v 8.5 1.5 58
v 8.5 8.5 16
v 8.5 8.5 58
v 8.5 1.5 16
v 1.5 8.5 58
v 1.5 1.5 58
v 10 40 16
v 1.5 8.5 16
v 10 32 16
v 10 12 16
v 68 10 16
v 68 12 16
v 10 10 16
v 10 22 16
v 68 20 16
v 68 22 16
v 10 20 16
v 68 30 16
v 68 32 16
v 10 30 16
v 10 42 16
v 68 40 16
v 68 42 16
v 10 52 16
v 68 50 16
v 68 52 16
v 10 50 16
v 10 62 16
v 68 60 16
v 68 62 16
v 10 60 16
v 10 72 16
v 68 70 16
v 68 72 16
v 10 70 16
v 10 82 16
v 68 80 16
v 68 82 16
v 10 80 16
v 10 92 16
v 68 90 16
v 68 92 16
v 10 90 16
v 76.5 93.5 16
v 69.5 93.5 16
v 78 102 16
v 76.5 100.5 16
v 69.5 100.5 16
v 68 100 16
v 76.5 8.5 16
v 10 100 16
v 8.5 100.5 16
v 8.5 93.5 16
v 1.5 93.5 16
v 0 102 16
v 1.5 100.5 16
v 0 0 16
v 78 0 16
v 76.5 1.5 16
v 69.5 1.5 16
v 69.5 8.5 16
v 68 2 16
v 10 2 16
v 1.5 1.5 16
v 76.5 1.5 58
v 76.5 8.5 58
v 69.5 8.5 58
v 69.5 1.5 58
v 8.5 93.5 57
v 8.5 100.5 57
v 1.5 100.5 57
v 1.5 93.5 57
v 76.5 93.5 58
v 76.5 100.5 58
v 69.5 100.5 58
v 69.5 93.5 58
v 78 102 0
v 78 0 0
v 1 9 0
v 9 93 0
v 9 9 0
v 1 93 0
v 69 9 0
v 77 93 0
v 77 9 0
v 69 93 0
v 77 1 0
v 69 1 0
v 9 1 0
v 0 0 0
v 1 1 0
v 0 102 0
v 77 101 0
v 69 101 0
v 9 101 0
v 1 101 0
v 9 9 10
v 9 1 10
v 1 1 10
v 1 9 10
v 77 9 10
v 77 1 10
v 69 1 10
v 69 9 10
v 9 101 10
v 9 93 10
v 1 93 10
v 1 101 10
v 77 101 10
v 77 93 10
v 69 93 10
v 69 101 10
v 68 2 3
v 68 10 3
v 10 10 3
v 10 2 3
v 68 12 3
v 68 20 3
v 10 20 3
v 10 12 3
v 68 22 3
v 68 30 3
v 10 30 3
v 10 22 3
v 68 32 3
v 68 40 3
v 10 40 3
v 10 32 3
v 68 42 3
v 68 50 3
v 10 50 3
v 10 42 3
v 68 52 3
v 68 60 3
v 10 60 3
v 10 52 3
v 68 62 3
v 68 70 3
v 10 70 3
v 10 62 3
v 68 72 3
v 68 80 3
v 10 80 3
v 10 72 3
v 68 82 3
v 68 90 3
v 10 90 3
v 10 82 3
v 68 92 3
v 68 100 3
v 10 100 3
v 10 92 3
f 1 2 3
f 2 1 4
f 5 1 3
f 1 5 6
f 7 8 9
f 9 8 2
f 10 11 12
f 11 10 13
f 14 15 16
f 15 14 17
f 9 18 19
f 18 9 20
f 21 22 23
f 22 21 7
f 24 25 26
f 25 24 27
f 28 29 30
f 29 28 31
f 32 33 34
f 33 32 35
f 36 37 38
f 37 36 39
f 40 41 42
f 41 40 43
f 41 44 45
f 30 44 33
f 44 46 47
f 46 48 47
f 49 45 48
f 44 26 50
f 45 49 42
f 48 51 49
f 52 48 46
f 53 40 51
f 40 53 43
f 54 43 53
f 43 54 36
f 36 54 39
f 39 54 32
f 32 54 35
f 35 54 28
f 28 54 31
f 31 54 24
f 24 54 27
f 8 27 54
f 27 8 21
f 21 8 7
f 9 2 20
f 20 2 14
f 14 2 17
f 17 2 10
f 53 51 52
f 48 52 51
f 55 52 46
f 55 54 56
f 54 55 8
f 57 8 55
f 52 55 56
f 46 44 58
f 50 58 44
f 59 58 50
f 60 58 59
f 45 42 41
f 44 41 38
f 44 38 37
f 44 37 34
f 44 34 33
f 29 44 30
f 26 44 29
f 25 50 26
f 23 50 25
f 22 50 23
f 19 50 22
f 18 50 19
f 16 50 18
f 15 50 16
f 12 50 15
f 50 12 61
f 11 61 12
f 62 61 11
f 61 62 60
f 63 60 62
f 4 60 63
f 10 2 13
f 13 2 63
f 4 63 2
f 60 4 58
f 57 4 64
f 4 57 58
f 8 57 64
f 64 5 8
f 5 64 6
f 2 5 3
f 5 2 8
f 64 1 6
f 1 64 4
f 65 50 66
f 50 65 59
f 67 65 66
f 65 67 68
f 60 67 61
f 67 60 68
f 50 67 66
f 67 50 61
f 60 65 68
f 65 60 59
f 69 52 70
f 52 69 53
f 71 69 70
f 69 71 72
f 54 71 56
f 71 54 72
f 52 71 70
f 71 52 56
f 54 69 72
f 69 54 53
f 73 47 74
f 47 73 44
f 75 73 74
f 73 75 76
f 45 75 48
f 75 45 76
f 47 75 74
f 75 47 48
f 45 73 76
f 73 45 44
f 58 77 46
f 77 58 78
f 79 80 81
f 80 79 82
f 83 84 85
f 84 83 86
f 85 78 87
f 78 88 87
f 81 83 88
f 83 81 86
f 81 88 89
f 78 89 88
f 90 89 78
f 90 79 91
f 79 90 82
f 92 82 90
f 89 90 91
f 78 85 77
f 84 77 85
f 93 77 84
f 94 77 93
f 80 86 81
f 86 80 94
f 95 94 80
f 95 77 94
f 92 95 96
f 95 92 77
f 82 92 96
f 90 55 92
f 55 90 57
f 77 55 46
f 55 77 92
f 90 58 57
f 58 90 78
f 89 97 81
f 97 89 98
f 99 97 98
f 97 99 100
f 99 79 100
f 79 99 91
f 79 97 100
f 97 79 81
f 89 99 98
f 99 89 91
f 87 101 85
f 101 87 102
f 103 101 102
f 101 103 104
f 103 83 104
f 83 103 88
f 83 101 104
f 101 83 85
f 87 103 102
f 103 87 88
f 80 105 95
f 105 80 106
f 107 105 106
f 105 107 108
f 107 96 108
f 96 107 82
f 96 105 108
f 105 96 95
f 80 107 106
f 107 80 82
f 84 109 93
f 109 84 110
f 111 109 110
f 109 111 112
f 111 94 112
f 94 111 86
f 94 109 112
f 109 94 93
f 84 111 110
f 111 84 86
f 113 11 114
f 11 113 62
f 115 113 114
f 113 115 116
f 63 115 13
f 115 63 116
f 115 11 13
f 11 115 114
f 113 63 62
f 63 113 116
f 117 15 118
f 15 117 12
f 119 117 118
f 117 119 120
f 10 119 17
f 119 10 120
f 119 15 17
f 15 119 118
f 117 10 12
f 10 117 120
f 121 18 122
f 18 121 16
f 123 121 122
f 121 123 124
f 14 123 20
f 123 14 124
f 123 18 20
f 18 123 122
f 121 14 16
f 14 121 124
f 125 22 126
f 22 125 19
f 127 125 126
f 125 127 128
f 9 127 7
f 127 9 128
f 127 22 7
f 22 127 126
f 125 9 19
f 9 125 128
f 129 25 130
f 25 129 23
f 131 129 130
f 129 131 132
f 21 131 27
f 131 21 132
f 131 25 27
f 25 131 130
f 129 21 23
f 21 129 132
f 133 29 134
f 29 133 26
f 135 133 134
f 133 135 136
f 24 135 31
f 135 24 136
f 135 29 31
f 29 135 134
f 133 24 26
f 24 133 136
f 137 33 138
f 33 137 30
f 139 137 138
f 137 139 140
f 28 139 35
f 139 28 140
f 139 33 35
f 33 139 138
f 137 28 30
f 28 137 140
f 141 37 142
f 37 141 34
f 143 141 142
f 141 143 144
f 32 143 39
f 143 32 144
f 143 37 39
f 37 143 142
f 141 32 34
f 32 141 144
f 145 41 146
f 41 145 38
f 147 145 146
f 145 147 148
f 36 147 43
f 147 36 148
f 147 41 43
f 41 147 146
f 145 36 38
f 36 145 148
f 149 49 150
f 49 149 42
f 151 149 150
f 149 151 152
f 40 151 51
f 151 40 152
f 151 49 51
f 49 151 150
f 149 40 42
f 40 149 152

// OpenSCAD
// Gameboy Cartridge Holder version 2.0
// Design by Patrick Connelly (patrick@deadlypenguin.com)

/* [Cartridge] */
cartridge_type = "gba"; //[gba: Gameboy Advanced,gbc:Gameboy Classic,both: Both]
number_of_cartridges = 10; //[5:15]
allow_cartridge_removal = "no"; // [yes,no]

/* [Hidden] */
cart_width = 58;
cart_depth = 8;
gba_cart_height = 35;
gbc_cart_height = 65;

cart_pocket_height = 14;
cart_pocket_gap = 2;

base_height = 16;

no_remove_padding = 10;

support_rod_width = 7;
support_rod_depth = support_rod_width;

support_pocket_inner_padding = 1;

support_pocket_width = support_rod_width + support_pocket_inner_padding;
support_pocket_depth = support_rod_depth + support_pocket_inner_padding;
support_pocket_height = 10;
support_pocket_padding = 1;

cart_height = (cartridge_type == "gba") ? gba_cart_height : gbc_cart_height;
cart_padding = (allow_cartridge_removal == "no") ? no_remove_padding : no_remove_padding + cart_height;

// Default to gba with no-remove
support_rod_height = (cart_height - cart_pocket_height) + cart_padding + support_pocket_height;

echo(support_rod_height);
support_rod_padding = support_pocket_padding + ((support_pocket_width - support_rod_width) / 2);

base_depth = (cart_depth + cart_pocket_gap) * number_of_cartridges + cart_pocket_gap;

side_rail_width = support_pocket_width + support_pocket_padding * 2;

base_width = cart_width + side_rail_width * 2;

module base() {
	cube([base_width, base_depth, base_height]);
}

module support_pockets() {
	support_pocket_x = base_width - support_pocket_padding - support_pocket_width;
	support_pocket_y = base_depth - support_pocket_padding - support_pocket_width;
	union() {
		translate([support_pocket_padding,support_pocket_padding,-1])
			cube([support_pocket_width, support_pocket_depth, support_pocket_height + 1]);
		translate([support_pocket_x, support_pocket_padding, -1])
		cube([support_pocket_width, support_pocket_depth, support_pocket_height + 1]);
		translate([support_pocket_padding, support_pocket_y, -1])
		cube([support_pocket_width, support_pocket_depth, support_pocket_height + 1]);
		translate([support_pocket_x, support_pocket_y, -1])
		cube([support_pocket_width, support_pocket_depth, support_pocket_height + 1]);
	}
}

module support_rods() {
	support_rod_x = base_width - support_rod_padding - support_rod_width;
	support_rod_y = base_depth - support_rod_padding - support_rod_width;
	
	union() {
		translate([support_rod_padding,support_rod_padding,base_height])
			cube([support_rod_width, support_rod_depth, support_rod_height + 1]);
		translate([support_rod_x, support_rod_padding, base_height])
		cube([support_rod_width, support_rod_depth, support_rod_height + 1]);
		translate([support_rod_padding, support_rod_y, base_height])
		cube([support_rod_width, support_rod_depth, support_rod_height]);
		translate([support_rod_x, support_rod_y, base_height])
		cube([support_rod_width, support_rod_depth, support_rod_height + 1]);
	}
}

module cartridge_slots() {
	union() {
		for (i = [0:number_of_cartridges - 1]) {
			current_y = cart_pocket_gap + ((cart_depth + cart_pocket_gap) * i);
			translate([side_rail_width, current_y, base_height - cart_pocket_height + 1])
			cube([cart_width, cart_depth, cart_pocket_height + 1]);
		}
	}
}

difference() {
	union() {
		base();
		support_rods();
	}
	support_pockets();
	cartridge_slots();
}
